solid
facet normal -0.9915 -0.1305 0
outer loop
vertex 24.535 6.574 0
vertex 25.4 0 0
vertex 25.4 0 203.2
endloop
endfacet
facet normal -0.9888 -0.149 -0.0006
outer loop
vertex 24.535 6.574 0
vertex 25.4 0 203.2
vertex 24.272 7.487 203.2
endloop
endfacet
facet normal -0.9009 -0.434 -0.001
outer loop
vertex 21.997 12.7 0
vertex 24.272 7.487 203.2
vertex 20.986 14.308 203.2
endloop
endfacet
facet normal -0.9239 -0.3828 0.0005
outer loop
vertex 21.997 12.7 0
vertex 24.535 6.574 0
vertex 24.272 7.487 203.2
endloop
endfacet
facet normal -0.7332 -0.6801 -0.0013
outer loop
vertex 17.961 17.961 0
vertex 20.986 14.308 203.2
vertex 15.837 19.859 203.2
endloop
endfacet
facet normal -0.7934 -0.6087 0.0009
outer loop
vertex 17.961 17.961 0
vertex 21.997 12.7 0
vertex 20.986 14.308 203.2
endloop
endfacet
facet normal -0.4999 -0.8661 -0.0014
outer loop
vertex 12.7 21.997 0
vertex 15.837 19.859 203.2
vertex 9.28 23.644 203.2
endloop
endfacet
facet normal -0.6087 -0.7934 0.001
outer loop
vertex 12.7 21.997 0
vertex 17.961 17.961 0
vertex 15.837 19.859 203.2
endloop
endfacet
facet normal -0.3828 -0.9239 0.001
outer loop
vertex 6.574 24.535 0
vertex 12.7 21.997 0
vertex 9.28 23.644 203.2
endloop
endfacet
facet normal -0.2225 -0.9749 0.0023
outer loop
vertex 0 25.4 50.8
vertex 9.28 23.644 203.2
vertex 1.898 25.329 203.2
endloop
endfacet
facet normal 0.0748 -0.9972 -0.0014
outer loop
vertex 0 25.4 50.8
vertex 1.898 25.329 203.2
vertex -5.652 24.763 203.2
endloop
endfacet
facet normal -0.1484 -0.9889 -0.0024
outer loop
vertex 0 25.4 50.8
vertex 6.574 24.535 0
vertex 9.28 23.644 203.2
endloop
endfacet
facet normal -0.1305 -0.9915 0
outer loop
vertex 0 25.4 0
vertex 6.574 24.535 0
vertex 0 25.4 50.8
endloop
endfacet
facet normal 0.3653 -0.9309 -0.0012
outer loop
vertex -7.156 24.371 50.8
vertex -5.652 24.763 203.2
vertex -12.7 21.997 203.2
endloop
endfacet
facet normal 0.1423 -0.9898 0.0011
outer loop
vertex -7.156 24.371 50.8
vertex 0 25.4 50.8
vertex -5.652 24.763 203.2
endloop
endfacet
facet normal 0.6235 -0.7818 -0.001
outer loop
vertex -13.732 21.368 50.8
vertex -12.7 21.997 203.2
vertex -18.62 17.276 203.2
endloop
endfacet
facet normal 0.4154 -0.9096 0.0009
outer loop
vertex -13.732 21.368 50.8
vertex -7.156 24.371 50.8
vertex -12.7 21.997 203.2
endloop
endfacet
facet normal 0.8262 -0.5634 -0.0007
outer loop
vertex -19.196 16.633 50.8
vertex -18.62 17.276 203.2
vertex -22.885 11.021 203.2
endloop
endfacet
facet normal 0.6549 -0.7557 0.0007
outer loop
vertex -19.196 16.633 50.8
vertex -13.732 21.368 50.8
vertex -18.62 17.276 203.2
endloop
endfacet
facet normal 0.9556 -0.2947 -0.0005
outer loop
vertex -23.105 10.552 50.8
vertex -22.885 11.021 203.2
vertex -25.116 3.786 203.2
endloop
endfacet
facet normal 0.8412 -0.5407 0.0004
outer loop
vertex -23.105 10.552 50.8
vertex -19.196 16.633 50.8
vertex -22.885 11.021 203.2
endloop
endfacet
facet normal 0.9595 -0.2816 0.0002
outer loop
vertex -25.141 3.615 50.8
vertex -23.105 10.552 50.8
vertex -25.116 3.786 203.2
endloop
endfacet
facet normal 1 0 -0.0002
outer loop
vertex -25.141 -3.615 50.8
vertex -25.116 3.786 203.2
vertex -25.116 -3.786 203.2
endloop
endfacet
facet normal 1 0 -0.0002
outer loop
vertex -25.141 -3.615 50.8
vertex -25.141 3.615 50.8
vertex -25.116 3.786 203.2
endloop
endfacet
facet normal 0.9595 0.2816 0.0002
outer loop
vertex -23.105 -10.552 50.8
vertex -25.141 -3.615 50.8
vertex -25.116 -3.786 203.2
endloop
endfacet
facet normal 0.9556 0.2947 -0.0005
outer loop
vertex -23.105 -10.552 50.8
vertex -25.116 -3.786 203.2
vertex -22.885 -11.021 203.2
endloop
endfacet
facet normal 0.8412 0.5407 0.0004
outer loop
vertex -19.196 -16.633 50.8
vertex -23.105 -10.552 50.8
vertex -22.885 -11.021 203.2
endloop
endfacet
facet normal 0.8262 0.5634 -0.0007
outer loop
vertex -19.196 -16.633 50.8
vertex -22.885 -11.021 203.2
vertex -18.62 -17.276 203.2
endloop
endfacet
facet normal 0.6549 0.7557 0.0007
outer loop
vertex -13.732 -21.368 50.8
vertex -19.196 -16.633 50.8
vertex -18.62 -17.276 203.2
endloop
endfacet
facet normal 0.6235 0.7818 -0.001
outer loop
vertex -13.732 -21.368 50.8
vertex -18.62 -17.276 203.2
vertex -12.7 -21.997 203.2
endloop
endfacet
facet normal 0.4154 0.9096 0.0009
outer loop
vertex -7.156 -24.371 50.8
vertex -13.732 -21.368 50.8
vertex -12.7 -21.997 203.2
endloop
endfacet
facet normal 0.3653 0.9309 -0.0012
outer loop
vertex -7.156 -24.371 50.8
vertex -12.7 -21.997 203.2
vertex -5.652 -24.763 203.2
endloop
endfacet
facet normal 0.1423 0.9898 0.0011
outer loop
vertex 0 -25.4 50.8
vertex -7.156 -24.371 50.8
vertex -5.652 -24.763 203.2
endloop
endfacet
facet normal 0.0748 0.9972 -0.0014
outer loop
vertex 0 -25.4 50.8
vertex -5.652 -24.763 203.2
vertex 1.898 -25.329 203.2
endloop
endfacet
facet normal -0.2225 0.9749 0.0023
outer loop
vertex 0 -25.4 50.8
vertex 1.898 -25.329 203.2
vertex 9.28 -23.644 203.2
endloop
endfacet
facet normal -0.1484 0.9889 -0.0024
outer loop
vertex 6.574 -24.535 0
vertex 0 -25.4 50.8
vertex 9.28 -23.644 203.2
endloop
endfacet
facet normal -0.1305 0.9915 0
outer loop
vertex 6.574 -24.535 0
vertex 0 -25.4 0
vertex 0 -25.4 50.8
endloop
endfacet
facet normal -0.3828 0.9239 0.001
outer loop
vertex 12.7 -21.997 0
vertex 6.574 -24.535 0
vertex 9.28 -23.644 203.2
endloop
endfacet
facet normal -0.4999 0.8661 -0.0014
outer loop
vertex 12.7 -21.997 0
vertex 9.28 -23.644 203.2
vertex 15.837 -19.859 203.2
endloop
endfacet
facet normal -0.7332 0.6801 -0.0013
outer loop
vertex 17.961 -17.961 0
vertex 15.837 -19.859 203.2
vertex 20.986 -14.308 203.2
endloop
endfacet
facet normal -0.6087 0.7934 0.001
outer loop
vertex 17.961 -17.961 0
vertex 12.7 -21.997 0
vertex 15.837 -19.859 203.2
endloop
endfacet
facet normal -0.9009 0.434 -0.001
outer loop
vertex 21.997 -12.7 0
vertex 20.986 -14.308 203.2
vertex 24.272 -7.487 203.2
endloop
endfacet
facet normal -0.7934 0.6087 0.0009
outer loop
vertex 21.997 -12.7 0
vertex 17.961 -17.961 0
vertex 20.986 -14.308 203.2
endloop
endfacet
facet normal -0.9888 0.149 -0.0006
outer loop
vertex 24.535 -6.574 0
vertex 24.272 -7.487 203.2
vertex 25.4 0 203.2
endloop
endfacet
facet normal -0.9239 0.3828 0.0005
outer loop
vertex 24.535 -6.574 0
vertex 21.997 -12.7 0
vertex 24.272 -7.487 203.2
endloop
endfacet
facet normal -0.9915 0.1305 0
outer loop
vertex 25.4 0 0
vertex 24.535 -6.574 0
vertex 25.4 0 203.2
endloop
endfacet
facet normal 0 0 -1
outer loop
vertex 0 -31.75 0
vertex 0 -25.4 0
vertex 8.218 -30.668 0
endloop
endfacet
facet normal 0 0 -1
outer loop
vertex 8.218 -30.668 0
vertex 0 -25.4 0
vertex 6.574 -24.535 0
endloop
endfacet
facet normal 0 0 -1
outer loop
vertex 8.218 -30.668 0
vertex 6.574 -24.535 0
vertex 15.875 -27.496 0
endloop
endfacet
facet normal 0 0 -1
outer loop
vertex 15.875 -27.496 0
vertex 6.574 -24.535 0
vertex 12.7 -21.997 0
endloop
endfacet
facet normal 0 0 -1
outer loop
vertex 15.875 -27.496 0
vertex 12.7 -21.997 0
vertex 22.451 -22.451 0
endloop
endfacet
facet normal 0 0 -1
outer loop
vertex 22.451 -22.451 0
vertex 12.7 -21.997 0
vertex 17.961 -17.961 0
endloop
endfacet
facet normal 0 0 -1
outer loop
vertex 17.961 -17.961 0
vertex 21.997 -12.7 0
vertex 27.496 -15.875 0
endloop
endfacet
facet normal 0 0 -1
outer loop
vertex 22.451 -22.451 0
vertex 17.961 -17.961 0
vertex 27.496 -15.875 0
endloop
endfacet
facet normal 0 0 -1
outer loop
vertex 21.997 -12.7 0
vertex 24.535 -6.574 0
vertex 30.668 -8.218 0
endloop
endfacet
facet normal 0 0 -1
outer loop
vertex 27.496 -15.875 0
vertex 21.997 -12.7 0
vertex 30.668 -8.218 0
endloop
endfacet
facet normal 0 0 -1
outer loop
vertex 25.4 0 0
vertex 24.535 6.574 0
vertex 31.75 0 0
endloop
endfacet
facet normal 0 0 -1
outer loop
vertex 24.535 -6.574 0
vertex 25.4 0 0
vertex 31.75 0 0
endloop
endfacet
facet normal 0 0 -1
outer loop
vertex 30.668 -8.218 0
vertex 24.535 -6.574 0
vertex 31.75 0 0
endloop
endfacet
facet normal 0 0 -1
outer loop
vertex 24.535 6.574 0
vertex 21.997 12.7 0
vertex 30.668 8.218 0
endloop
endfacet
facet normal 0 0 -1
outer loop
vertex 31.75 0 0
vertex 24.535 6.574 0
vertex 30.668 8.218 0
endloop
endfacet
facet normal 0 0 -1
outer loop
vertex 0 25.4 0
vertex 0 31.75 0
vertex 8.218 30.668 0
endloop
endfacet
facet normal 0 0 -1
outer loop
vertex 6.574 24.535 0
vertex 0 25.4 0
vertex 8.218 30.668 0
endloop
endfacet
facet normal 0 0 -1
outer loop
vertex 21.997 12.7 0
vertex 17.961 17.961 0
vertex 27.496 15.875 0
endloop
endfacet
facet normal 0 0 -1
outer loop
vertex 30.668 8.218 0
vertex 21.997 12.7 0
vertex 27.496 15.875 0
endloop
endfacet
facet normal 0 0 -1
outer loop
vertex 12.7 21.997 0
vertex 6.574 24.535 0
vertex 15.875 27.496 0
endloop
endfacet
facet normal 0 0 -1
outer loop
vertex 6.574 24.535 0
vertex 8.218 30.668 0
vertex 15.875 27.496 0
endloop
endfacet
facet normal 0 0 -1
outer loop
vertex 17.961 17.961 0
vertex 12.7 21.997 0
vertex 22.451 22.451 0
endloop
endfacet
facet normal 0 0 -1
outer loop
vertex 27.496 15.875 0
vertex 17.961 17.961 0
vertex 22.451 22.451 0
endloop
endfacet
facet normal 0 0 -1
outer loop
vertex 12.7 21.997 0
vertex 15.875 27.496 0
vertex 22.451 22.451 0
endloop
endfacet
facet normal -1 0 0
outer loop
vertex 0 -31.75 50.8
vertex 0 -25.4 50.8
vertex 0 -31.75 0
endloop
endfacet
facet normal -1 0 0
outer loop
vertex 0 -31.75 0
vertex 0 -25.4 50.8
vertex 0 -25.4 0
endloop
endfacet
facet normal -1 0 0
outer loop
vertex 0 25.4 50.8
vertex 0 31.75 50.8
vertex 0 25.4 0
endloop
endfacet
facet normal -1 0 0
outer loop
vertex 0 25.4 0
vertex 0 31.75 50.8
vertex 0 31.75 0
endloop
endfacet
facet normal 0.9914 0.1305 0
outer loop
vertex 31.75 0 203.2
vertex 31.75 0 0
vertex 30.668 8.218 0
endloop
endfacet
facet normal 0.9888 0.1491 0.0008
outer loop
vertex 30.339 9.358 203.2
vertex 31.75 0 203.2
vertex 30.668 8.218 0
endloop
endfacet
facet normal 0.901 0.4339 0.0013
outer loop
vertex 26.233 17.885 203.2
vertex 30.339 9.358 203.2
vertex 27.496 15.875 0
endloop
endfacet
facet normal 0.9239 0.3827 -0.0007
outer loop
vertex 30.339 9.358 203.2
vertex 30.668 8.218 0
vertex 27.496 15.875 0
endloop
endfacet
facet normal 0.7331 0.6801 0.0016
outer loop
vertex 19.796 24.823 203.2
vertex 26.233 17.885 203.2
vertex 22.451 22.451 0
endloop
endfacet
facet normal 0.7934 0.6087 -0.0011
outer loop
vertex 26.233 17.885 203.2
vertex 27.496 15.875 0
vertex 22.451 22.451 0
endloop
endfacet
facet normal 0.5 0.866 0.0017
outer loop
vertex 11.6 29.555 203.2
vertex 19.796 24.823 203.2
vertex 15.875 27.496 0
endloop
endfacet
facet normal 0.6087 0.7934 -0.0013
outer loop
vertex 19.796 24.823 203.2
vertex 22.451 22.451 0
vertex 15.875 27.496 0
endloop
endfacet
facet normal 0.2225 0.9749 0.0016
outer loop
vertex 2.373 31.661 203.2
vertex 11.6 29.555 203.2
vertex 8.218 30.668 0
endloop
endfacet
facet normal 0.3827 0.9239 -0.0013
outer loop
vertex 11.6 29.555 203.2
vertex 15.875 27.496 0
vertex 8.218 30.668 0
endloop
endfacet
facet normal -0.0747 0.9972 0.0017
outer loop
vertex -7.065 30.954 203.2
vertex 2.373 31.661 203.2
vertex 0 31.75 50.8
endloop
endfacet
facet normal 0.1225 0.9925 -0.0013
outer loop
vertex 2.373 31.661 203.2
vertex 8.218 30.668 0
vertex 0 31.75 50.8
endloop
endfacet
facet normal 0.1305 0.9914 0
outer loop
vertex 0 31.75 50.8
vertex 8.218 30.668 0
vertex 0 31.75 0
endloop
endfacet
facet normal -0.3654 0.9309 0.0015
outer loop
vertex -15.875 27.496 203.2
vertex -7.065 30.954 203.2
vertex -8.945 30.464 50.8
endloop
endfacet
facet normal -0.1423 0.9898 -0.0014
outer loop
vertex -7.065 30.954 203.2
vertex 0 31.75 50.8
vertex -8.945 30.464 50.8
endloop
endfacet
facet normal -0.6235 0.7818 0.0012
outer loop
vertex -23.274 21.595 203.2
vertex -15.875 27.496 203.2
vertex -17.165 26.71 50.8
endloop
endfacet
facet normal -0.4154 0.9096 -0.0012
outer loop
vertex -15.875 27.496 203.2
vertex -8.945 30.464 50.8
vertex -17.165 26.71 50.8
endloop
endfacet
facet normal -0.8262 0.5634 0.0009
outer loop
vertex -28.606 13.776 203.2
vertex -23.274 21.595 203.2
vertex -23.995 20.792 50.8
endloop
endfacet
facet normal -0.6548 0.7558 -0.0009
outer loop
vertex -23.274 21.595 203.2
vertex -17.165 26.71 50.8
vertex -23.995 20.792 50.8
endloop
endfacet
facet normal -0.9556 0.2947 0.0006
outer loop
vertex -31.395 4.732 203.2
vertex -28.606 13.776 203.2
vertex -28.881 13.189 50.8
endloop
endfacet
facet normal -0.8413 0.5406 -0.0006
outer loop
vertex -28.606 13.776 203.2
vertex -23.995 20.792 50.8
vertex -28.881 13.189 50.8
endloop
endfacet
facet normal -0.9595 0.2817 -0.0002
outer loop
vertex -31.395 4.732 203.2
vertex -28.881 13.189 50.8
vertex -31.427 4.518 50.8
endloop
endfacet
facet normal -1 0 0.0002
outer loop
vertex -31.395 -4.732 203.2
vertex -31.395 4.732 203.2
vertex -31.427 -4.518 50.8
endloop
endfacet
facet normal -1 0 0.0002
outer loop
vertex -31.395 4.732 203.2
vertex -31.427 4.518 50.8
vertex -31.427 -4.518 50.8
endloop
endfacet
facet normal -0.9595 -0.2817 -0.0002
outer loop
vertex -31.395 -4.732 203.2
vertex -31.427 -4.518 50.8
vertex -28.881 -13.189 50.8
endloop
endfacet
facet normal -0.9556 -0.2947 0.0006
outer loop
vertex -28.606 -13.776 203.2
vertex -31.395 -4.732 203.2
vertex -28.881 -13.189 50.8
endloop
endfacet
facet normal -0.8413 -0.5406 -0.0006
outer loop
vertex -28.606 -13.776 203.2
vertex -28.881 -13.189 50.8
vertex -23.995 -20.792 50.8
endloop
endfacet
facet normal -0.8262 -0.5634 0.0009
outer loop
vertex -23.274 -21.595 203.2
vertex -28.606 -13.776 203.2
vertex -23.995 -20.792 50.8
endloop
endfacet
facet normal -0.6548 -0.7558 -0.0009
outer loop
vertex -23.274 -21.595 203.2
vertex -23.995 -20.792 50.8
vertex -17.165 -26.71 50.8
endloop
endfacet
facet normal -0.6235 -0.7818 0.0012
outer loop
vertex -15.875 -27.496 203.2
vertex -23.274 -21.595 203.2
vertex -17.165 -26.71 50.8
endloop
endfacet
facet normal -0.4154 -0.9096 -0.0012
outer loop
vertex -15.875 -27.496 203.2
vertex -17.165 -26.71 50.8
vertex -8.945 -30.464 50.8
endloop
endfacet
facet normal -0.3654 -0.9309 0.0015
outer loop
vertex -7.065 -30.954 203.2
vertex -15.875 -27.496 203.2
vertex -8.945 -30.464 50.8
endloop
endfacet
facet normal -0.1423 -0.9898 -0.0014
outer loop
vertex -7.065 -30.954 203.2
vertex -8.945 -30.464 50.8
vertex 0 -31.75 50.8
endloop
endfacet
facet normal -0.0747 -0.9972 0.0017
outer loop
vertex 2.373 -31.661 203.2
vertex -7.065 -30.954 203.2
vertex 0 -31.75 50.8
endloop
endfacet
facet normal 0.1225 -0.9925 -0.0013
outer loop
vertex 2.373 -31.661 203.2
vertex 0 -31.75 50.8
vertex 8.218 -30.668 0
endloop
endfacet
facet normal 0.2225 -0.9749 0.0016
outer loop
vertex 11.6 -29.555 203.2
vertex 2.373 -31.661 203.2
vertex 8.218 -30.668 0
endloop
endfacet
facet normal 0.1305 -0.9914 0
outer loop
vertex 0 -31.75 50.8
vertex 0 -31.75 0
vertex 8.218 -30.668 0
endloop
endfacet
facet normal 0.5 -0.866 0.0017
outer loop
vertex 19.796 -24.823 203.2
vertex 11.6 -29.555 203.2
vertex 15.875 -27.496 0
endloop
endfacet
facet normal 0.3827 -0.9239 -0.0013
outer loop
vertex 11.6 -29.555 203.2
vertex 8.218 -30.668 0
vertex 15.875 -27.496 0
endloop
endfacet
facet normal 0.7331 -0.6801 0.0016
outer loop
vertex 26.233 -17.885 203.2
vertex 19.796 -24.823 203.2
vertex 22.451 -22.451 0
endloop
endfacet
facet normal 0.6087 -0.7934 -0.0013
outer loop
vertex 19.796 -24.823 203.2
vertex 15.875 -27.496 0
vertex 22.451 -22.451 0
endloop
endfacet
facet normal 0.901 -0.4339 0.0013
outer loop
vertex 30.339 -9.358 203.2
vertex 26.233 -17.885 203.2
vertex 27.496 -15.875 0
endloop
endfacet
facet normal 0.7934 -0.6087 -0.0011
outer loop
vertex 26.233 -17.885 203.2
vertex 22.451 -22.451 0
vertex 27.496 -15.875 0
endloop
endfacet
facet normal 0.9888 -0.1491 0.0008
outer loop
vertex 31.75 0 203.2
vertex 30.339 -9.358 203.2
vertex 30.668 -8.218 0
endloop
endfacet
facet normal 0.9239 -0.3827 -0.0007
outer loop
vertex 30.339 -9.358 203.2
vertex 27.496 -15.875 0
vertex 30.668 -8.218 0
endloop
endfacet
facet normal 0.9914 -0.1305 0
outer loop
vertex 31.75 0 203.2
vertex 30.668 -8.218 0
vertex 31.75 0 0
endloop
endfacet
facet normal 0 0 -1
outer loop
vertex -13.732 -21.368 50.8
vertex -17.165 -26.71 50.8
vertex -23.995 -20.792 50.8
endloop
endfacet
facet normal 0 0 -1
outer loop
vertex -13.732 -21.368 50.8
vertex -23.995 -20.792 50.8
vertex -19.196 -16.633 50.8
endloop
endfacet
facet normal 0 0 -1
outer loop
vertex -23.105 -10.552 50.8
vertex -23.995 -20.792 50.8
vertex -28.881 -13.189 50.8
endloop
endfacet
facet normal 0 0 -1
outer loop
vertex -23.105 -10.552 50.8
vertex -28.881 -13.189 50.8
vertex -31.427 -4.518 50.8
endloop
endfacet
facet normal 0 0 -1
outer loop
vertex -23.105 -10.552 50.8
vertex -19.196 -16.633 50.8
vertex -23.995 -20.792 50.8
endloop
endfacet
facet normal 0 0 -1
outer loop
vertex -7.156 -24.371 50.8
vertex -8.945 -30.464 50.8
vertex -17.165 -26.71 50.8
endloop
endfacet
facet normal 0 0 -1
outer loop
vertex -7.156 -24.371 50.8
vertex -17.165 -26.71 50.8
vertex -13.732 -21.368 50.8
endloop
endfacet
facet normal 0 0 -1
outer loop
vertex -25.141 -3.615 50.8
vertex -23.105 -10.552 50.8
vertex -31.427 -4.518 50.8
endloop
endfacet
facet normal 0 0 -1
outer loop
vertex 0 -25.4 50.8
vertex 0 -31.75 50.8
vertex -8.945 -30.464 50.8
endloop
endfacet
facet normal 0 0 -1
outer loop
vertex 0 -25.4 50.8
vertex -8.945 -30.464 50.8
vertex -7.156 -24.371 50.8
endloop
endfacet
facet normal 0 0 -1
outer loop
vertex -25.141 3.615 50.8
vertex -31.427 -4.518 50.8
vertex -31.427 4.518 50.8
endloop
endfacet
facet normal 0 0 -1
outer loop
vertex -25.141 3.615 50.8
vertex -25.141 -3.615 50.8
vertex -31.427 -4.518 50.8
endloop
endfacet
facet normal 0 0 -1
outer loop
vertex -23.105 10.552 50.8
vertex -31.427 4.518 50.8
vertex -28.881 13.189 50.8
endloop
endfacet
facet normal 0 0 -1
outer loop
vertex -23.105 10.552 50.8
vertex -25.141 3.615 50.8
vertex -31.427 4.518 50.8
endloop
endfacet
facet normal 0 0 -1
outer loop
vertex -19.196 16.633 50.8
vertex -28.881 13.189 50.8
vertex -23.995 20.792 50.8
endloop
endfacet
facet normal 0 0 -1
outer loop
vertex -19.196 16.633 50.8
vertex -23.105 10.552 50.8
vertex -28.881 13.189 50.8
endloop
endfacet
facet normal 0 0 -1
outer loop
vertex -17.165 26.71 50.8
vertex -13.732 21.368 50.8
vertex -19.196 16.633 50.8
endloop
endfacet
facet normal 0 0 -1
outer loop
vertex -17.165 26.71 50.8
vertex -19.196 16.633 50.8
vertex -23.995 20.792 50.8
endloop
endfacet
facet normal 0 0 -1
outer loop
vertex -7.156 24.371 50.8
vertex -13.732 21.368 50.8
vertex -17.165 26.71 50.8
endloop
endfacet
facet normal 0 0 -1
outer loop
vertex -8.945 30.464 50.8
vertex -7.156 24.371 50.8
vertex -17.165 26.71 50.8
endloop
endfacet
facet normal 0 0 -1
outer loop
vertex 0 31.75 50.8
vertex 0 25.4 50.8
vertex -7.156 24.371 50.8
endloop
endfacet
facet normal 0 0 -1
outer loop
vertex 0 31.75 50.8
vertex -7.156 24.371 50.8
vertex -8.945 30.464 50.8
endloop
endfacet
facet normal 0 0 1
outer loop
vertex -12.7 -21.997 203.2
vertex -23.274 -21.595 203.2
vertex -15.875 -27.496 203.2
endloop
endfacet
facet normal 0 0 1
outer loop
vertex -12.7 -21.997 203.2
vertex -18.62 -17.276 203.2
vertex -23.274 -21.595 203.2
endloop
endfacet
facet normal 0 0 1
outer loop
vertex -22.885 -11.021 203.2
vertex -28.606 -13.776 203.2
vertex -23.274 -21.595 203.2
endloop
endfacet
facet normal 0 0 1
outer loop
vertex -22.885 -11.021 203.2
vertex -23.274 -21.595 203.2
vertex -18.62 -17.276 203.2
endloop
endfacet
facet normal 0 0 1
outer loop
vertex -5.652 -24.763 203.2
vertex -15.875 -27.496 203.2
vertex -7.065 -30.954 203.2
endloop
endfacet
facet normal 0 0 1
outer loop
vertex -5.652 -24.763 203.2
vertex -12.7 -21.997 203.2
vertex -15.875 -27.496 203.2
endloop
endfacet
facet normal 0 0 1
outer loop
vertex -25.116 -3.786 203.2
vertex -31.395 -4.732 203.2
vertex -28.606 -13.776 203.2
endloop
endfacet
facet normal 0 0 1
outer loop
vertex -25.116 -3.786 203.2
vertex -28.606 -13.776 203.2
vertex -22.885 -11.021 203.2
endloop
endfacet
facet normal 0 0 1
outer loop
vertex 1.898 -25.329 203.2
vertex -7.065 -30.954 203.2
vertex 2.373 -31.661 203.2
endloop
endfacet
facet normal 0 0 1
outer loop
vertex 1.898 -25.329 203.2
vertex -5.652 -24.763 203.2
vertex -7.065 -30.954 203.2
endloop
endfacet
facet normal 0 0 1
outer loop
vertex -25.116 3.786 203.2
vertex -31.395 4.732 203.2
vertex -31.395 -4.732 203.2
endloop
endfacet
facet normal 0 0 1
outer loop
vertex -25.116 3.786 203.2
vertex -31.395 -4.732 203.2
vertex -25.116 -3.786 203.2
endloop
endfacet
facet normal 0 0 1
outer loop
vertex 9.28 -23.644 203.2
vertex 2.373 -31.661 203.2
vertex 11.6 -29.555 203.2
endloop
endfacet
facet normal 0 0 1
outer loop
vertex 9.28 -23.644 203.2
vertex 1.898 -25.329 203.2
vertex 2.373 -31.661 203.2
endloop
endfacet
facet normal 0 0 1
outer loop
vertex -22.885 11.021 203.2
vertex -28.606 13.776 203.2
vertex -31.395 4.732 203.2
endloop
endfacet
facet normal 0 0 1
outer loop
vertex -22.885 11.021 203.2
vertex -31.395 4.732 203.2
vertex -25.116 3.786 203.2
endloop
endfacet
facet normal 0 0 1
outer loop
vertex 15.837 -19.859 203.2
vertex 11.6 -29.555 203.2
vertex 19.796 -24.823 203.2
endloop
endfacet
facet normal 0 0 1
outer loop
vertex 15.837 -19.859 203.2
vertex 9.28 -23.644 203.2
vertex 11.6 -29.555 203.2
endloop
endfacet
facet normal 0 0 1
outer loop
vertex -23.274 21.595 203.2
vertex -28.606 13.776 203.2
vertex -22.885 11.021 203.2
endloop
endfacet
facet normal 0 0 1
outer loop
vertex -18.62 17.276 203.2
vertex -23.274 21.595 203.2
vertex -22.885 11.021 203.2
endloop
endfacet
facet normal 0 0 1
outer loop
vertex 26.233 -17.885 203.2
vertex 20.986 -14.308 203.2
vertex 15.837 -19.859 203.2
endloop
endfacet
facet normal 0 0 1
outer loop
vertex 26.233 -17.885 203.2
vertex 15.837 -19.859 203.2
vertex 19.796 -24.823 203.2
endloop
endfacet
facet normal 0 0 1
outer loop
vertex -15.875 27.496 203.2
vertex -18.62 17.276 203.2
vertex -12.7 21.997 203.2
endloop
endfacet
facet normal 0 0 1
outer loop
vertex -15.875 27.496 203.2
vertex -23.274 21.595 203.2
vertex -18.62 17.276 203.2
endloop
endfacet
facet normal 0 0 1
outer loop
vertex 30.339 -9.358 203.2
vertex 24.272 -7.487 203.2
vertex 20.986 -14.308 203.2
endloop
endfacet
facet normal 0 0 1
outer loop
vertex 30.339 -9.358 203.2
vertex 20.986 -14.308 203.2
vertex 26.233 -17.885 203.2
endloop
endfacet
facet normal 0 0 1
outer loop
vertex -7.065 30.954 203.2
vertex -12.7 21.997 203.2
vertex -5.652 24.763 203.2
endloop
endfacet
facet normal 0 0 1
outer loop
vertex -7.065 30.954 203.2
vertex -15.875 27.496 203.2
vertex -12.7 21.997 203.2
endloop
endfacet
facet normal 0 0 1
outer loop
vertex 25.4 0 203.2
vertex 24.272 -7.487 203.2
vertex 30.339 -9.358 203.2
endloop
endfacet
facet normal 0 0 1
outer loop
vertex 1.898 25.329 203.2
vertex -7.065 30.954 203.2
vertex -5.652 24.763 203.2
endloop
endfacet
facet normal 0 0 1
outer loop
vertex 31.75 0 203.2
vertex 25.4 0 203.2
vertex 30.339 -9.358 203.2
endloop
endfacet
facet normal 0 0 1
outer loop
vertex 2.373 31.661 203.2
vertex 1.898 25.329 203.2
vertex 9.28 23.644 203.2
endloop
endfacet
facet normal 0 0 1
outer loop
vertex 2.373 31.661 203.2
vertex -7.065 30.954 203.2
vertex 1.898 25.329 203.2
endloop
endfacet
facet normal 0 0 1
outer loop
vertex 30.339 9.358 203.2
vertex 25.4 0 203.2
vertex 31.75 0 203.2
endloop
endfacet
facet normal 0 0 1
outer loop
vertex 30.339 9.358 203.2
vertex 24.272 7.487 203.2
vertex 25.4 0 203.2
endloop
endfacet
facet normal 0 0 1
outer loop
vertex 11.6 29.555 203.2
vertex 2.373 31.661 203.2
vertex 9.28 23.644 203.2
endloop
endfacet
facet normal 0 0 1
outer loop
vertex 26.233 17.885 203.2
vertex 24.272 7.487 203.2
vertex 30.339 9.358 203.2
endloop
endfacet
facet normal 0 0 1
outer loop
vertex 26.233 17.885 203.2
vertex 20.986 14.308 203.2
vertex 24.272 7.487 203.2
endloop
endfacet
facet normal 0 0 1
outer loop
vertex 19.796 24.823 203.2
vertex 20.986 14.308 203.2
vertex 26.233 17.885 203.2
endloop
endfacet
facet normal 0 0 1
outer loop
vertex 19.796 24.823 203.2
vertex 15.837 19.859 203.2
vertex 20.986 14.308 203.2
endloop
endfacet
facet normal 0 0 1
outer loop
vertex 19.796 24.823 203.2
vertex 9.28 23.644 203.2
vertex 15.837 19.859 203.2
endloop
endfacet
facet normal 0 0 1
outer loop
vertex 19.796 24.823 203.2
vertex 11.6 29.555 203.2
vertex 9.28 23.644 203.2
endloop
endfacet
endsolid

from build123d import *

# Parameters (mm, degrees)
SKETCH1_R           = 31.75
SKETCH1_R_2         = 25.4
BOSS_EXTRUDE1_DEPTH = 203.2
CUT_EXTRUDE1_REACH  = 210.102
SKETCH2_W           = 50.8
SKETCH2_H           = 63.5


with BuildPart() as part:
    # Sketch1 → Boss-Extrude1 (new body)
    with BuildSketch(Plane.XY):
        Circle(SKETCH1_R)
        Circle(SKETCH1_R_2, mode=Mode.SUBTRACT)
    extrude(amount=BOSS_EXTRUDE1_DEPTH)

    # Sketch2 → Cut-Extrude1 (cut, up to next)
    with BuildSketch(Plane(origin=(0, 0, 0), x_dir=(0, 0, -1), z_dir=(1, 0, 0)), mode=Mode.PRIVATE) as cut_extrude1_sk1:
        with Locations((-25.4, 0)):
            Rectangle(SKETCH2_W, SKETCH2_H)
    cut_extrude1_tool1 = extrude(cut_extrude1_sk1.sketch, amount=-CUT_EXTRUDE1_REACH, mode=Mode.PRIVATE) & part.part
    add(cut_extrude1_tool1.solids().sort_by_distance((0, 0, 25.4))[0], mode=Mode.SUBTRACT)


solid = part.part
